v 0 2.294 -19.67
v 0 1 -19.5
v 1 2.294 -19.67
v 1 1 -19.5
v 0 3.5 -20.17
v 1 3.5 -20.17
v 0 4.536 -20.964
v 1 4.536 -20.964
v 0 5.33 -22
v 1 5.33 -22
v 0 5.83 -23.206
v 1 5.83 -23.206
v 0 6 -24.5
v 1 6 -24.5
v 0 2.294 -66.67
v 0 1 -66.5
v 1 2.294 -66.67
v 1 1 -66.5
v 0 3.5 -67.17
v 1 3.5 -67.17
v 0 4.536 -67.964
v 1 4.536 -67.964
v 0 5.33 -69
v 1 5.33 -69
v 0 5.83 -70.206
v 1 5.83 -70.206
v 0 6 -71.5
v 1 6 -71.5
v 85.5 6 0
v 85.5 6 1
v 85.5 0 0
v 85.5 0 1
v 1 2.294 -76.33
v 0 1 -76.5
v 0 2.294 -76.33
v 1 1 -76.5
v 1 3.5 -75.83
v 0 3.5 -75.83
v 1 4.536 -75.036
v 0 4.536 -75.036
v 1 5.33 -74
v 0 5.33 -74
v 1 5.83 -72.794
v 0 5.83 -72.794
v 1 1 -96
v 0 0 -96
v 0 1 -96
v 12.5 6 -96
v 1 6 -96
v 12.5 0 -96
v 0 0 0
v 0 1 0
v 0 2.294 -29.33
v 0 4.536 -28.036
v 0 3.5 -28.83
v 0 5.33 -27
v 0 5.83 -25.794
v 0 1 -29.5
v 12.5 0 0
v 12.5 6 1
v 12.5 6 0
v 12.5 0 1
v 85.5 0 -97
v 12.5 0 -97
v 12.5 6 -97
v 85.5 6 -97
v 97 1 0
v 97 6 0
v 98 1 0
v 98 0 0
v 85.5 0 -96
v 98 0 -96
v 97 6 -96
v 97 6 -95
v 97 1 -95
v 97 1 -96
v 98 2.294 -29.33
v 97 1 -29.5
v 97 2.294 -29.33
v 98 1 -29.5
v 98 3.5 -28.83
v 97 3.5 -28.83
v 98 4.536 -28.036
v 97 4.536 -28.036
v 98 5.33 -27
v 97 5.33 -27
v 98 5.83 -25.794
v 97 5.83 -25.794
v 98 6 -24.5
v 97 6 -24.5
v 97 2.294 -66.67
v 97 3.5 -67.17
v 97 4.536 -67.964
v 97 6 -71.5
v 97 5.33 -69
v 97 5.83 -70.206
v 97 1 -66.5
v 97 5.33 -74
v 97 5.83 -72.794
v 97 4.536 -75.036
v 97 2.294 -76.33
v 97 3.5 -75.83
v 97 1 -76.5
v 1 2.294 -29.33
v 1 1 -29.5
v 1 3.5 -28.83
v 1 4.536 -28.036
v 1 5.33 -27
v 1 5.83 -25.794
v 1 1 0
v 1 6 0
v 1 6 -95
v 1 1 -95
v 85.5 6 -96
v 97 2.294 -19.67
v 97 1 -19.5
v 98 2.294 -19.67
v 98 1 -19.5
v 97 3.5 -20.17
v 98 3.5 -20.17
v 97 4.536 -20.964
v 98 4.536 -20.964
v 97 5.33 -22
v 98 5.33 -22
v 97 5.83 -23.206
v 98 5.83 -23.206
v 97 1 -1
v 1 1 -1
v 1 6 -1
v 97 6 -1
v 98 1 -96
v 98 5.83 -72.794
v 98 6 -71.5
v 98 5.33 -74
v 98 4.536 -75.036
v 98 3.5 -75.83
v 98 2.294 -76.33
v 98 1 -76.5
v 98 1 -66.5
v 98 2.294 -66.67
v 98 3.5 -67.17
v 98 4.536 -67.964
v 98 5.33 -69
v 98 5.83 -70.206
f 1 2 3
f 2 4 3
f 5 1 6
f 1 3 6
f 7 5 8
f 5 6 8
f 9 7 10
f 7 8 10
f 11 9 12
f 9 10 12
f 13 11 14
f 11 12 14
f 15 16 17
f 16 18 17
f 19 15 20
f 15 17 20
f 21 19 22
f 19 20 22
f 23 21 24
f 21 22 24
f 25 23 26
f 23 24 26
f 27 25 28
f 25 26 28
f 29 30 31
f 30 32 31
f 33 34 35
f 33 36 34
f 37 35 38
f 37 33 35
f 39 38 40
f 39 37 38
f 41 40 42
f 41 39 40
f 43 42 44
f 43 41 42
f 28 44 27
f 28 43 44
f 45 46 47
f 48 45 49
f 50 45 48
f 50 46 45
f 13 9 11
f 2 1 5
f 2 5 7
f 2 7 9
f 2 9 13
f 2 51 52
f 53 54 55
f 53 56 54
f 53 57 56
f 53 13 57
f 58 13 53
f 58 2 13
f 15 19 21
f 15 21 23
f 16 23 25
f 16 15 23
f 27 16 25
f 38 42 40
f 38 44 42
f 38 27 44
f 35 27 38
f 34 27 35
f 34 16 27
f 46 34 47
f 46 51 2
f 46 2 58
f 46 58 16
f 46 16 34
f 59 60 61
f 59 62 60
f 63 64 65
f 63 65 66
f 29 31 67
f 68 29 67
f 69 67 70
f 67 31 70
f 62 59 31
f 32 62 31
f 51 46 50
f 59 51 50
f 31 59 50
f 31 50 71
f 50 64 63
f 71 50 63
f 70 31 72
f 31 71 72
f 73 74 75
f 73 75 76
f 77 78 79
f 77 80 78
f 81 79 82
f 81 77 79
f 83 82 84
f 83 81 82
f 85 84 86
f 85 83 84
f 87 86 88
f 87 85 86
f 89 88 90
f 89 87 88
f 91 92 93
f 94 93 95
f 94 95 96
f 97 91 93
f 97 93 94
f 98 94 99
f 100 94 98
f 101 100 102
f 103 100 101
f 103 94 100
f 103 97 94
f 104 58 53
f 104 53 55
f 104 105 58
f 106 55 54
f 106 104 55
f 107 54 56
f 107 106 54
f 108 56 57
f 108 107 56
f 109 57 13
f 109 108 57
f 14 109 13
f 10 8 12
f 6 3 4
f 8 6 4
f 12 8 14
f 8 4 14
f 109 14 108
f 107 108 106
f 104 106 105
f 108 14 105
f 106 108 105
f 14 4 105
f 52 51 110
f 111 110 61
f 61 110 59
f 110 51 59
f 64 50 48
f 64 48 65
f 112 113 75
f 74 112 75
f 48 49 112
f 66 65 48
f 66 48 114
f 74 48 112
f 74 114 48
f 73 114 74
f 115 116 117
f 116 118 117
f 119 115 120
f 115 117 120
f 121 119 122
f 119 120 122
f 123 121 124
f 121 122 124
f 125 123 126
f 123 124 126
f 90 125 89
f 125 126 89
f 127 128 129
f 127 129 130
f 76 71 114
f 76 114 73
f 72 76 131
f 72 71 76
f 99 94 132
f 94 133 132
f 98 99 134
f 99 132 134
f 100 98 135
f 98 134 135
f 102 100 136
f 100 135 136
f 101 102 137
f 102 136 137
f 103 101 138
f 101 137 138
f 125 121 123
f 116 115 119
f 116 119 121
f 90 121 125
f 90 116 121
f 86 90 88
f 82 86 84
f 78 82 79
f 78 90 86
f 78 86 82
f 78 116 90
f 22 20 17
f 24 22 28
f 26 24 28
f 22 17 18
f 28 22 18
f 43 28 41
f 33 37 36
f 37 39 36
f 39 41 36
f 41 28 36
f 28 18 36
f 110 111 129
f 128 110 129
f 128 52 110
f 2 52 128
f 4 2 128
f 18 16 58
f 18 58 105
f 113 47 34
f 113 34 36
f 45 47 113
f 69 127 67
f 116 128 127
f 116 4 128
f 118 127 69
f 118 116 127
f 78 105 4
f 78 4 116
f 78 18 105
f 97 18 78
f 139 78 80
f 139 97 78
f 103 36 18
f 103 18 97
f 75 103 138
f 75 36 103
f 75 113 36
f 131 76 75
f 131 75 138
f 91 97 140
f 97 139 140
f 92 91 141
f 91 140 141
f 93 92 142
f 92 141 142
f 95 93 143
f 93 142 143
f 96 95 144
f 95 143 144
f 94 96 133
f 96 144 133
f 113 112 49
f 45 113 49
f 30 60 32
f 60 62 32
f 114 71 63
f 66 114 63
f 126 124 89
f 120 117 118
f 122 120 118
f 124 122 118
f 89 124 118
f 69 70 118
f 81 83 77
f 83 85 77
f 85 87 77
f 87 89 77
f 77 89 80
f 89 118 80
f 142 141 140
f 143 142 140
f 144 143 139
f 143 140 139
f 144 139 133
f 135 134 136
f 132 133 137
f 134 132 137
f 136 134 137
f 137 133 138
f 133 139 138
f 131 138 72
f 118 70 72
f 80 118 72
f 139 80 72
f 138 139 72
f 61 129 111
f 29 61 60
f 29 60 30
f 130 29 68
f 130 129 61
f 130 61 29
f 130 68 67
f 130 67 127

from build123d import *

# Parameters (mm, degrees)
SKETCH1_W           = 98
SKETCH1_H           = 96
SKETCH1_W_2         = 73
SKETCH1_H_2         = 1
BOSS_EXTRUDE1_DEPTH = 1
SKETCH2_W           = 73
SKETCH2_H           = 1
BOSS_EXTRUDE2_DEPTH = 5
SKETCH3_W           = 98
SKETCH3_H           = 1
BOSS_EXTRUDE3_DEPTH = 5
SKETCH4_W           = 1
SKETCH4_H           = 10
BOSS_EXTRUDE4_DEPTH = 5
FILLET1_R           = 5
FILLET2_R           = 5
SKETCH5_W           = 1
SKETCH5_H           = 1
CUT_EXTRUDE1_DEPTH  = 5


with BuildPart() as part:
    # Sketch1 → Boss-Extrude1 (new body)
    with BuildSketch(Plane(origin=(0, 0, 0), x_dir=(1, 0, 0), z_dir=(0, 1, 0))):
        with Locations((49, 48)):
            Rectangle(SKETCH1_W, SKETCH1_H)
        with Locations((49, 96.5)):
            Rectangle(SKETCH1_W_2, SKETCH1_H_2)
        with Locations((49, -0.5)):
            Rectangle(SKETCH1_W_2, SKETCH1_H_2)
    extrude(amount=BOSS_EXTRUDE1_DEPTH)

    # Sketch2 → Boss-Extrude2 (add)
    with BuildSketch(Plane(origin=(0, 1, 0), x_dir=(1, 0, 0), z_dir=(0, 1, 0))):
        with Locations((49, -0.5)):
            Rectangle(SKETCH2_W, SKETCH2_H)
        with Locations((49, 96.5)):
            Rectangle(SKETCH2_W, SKETCH2_H)
    extrude(amount=BOSS_EXTRUDE2_DEPTH)

    # Sketch3 → Boss-Extrude3 (add)
    with BuildSketch(Plane(origin=(0, 1, 0), x_dir=(1, 0, 0), z_dir=(0, 1, 0))):
        with Locations((49, 95.5)):
            Rectangle(SKETCH3_W, SKETCH3_H)
        with Locations((49, 0.5)):
            Rectangle(SKETCH3_W, SKETCH3_H)
    extrude(amount=BOSS_EXTRUDE3_DEPTH)

    # Sketch4 → Boss-Extrude4 (add)
    with BuildSketch(Plane(origin=(0, 1, 0), x_dir=(1, 0, 0), z_dir=(0, 1, 0))):
        with Locations((0.5, 71.5)):
            Rectangle(SKETCH4_W, SKETCH4_H)
        with Locations((0.5, 24.5)):
            Rectangle(SKETCH4_W, SKETCH4_H)
        with Locations((97.5, 71.5)):
            Rectangle(SKETCH4_W, SKETCH4_H)
        with Locations((97.5, 24.5)):
            Rectangle(SKETCH4_W, SKETCH4_H)
    extrude(amount=BOSS_EXTRUDE4_DEPTH)

    # Fillet1
    fillet1_edges = [part.edges().sort_by_distance(p)[0] for p in [
        (97.5, 6, -19.5),
        (97.5, 6, -29.5),
    ]]
    fillet(fillet1_edges, radius=FILLET1_R - 0.0001)  # a hair under: the kernel refuses the full size

    # Fillet2
    fillet2_edges = [part.edges().sort_by_distance(p)[0] for p in [
        (0.5, 6, -29.5),
        (0.5, 6, -19.5),
        (0.5, 6, -66.5),
        (0.5, 6, -76.5),
        (97.5, 6, -66.5),
        (97.5, 6, -76.5),
    ]]
    fillet(fillet2_edges, radius=FILLET2_R - 0.0001)  # a hair under: the kernel refuses the full size

    # Sketch5 → Cut-Extrude1 (cut)
    with BuildSketch(Plane(origin=(0, 6, 0), x_dir=(1, 0, 0), z_dir=(0, 1, 0))):
        with Locations((0.5, 0.5)):
            Rectangle(SKETCH5_W, SKETCH5_H)
        with Locations((97.5, 0.5)):
            Rectangle(SKETCH5_W, SKETCH5_H)
        with Locations((97.5, 95.5)):
            Rectangle(SKETCH5_W, SKETCH5_H)
        with Locations((0.5, 95.5)):
            Rectangle(SKETCH5_W, SKETCH5_H)
    extrude(amount=-CUT_EXTRUDE1_DEPTH, mode=Mode.SUBTRACT)


solid = part.part
